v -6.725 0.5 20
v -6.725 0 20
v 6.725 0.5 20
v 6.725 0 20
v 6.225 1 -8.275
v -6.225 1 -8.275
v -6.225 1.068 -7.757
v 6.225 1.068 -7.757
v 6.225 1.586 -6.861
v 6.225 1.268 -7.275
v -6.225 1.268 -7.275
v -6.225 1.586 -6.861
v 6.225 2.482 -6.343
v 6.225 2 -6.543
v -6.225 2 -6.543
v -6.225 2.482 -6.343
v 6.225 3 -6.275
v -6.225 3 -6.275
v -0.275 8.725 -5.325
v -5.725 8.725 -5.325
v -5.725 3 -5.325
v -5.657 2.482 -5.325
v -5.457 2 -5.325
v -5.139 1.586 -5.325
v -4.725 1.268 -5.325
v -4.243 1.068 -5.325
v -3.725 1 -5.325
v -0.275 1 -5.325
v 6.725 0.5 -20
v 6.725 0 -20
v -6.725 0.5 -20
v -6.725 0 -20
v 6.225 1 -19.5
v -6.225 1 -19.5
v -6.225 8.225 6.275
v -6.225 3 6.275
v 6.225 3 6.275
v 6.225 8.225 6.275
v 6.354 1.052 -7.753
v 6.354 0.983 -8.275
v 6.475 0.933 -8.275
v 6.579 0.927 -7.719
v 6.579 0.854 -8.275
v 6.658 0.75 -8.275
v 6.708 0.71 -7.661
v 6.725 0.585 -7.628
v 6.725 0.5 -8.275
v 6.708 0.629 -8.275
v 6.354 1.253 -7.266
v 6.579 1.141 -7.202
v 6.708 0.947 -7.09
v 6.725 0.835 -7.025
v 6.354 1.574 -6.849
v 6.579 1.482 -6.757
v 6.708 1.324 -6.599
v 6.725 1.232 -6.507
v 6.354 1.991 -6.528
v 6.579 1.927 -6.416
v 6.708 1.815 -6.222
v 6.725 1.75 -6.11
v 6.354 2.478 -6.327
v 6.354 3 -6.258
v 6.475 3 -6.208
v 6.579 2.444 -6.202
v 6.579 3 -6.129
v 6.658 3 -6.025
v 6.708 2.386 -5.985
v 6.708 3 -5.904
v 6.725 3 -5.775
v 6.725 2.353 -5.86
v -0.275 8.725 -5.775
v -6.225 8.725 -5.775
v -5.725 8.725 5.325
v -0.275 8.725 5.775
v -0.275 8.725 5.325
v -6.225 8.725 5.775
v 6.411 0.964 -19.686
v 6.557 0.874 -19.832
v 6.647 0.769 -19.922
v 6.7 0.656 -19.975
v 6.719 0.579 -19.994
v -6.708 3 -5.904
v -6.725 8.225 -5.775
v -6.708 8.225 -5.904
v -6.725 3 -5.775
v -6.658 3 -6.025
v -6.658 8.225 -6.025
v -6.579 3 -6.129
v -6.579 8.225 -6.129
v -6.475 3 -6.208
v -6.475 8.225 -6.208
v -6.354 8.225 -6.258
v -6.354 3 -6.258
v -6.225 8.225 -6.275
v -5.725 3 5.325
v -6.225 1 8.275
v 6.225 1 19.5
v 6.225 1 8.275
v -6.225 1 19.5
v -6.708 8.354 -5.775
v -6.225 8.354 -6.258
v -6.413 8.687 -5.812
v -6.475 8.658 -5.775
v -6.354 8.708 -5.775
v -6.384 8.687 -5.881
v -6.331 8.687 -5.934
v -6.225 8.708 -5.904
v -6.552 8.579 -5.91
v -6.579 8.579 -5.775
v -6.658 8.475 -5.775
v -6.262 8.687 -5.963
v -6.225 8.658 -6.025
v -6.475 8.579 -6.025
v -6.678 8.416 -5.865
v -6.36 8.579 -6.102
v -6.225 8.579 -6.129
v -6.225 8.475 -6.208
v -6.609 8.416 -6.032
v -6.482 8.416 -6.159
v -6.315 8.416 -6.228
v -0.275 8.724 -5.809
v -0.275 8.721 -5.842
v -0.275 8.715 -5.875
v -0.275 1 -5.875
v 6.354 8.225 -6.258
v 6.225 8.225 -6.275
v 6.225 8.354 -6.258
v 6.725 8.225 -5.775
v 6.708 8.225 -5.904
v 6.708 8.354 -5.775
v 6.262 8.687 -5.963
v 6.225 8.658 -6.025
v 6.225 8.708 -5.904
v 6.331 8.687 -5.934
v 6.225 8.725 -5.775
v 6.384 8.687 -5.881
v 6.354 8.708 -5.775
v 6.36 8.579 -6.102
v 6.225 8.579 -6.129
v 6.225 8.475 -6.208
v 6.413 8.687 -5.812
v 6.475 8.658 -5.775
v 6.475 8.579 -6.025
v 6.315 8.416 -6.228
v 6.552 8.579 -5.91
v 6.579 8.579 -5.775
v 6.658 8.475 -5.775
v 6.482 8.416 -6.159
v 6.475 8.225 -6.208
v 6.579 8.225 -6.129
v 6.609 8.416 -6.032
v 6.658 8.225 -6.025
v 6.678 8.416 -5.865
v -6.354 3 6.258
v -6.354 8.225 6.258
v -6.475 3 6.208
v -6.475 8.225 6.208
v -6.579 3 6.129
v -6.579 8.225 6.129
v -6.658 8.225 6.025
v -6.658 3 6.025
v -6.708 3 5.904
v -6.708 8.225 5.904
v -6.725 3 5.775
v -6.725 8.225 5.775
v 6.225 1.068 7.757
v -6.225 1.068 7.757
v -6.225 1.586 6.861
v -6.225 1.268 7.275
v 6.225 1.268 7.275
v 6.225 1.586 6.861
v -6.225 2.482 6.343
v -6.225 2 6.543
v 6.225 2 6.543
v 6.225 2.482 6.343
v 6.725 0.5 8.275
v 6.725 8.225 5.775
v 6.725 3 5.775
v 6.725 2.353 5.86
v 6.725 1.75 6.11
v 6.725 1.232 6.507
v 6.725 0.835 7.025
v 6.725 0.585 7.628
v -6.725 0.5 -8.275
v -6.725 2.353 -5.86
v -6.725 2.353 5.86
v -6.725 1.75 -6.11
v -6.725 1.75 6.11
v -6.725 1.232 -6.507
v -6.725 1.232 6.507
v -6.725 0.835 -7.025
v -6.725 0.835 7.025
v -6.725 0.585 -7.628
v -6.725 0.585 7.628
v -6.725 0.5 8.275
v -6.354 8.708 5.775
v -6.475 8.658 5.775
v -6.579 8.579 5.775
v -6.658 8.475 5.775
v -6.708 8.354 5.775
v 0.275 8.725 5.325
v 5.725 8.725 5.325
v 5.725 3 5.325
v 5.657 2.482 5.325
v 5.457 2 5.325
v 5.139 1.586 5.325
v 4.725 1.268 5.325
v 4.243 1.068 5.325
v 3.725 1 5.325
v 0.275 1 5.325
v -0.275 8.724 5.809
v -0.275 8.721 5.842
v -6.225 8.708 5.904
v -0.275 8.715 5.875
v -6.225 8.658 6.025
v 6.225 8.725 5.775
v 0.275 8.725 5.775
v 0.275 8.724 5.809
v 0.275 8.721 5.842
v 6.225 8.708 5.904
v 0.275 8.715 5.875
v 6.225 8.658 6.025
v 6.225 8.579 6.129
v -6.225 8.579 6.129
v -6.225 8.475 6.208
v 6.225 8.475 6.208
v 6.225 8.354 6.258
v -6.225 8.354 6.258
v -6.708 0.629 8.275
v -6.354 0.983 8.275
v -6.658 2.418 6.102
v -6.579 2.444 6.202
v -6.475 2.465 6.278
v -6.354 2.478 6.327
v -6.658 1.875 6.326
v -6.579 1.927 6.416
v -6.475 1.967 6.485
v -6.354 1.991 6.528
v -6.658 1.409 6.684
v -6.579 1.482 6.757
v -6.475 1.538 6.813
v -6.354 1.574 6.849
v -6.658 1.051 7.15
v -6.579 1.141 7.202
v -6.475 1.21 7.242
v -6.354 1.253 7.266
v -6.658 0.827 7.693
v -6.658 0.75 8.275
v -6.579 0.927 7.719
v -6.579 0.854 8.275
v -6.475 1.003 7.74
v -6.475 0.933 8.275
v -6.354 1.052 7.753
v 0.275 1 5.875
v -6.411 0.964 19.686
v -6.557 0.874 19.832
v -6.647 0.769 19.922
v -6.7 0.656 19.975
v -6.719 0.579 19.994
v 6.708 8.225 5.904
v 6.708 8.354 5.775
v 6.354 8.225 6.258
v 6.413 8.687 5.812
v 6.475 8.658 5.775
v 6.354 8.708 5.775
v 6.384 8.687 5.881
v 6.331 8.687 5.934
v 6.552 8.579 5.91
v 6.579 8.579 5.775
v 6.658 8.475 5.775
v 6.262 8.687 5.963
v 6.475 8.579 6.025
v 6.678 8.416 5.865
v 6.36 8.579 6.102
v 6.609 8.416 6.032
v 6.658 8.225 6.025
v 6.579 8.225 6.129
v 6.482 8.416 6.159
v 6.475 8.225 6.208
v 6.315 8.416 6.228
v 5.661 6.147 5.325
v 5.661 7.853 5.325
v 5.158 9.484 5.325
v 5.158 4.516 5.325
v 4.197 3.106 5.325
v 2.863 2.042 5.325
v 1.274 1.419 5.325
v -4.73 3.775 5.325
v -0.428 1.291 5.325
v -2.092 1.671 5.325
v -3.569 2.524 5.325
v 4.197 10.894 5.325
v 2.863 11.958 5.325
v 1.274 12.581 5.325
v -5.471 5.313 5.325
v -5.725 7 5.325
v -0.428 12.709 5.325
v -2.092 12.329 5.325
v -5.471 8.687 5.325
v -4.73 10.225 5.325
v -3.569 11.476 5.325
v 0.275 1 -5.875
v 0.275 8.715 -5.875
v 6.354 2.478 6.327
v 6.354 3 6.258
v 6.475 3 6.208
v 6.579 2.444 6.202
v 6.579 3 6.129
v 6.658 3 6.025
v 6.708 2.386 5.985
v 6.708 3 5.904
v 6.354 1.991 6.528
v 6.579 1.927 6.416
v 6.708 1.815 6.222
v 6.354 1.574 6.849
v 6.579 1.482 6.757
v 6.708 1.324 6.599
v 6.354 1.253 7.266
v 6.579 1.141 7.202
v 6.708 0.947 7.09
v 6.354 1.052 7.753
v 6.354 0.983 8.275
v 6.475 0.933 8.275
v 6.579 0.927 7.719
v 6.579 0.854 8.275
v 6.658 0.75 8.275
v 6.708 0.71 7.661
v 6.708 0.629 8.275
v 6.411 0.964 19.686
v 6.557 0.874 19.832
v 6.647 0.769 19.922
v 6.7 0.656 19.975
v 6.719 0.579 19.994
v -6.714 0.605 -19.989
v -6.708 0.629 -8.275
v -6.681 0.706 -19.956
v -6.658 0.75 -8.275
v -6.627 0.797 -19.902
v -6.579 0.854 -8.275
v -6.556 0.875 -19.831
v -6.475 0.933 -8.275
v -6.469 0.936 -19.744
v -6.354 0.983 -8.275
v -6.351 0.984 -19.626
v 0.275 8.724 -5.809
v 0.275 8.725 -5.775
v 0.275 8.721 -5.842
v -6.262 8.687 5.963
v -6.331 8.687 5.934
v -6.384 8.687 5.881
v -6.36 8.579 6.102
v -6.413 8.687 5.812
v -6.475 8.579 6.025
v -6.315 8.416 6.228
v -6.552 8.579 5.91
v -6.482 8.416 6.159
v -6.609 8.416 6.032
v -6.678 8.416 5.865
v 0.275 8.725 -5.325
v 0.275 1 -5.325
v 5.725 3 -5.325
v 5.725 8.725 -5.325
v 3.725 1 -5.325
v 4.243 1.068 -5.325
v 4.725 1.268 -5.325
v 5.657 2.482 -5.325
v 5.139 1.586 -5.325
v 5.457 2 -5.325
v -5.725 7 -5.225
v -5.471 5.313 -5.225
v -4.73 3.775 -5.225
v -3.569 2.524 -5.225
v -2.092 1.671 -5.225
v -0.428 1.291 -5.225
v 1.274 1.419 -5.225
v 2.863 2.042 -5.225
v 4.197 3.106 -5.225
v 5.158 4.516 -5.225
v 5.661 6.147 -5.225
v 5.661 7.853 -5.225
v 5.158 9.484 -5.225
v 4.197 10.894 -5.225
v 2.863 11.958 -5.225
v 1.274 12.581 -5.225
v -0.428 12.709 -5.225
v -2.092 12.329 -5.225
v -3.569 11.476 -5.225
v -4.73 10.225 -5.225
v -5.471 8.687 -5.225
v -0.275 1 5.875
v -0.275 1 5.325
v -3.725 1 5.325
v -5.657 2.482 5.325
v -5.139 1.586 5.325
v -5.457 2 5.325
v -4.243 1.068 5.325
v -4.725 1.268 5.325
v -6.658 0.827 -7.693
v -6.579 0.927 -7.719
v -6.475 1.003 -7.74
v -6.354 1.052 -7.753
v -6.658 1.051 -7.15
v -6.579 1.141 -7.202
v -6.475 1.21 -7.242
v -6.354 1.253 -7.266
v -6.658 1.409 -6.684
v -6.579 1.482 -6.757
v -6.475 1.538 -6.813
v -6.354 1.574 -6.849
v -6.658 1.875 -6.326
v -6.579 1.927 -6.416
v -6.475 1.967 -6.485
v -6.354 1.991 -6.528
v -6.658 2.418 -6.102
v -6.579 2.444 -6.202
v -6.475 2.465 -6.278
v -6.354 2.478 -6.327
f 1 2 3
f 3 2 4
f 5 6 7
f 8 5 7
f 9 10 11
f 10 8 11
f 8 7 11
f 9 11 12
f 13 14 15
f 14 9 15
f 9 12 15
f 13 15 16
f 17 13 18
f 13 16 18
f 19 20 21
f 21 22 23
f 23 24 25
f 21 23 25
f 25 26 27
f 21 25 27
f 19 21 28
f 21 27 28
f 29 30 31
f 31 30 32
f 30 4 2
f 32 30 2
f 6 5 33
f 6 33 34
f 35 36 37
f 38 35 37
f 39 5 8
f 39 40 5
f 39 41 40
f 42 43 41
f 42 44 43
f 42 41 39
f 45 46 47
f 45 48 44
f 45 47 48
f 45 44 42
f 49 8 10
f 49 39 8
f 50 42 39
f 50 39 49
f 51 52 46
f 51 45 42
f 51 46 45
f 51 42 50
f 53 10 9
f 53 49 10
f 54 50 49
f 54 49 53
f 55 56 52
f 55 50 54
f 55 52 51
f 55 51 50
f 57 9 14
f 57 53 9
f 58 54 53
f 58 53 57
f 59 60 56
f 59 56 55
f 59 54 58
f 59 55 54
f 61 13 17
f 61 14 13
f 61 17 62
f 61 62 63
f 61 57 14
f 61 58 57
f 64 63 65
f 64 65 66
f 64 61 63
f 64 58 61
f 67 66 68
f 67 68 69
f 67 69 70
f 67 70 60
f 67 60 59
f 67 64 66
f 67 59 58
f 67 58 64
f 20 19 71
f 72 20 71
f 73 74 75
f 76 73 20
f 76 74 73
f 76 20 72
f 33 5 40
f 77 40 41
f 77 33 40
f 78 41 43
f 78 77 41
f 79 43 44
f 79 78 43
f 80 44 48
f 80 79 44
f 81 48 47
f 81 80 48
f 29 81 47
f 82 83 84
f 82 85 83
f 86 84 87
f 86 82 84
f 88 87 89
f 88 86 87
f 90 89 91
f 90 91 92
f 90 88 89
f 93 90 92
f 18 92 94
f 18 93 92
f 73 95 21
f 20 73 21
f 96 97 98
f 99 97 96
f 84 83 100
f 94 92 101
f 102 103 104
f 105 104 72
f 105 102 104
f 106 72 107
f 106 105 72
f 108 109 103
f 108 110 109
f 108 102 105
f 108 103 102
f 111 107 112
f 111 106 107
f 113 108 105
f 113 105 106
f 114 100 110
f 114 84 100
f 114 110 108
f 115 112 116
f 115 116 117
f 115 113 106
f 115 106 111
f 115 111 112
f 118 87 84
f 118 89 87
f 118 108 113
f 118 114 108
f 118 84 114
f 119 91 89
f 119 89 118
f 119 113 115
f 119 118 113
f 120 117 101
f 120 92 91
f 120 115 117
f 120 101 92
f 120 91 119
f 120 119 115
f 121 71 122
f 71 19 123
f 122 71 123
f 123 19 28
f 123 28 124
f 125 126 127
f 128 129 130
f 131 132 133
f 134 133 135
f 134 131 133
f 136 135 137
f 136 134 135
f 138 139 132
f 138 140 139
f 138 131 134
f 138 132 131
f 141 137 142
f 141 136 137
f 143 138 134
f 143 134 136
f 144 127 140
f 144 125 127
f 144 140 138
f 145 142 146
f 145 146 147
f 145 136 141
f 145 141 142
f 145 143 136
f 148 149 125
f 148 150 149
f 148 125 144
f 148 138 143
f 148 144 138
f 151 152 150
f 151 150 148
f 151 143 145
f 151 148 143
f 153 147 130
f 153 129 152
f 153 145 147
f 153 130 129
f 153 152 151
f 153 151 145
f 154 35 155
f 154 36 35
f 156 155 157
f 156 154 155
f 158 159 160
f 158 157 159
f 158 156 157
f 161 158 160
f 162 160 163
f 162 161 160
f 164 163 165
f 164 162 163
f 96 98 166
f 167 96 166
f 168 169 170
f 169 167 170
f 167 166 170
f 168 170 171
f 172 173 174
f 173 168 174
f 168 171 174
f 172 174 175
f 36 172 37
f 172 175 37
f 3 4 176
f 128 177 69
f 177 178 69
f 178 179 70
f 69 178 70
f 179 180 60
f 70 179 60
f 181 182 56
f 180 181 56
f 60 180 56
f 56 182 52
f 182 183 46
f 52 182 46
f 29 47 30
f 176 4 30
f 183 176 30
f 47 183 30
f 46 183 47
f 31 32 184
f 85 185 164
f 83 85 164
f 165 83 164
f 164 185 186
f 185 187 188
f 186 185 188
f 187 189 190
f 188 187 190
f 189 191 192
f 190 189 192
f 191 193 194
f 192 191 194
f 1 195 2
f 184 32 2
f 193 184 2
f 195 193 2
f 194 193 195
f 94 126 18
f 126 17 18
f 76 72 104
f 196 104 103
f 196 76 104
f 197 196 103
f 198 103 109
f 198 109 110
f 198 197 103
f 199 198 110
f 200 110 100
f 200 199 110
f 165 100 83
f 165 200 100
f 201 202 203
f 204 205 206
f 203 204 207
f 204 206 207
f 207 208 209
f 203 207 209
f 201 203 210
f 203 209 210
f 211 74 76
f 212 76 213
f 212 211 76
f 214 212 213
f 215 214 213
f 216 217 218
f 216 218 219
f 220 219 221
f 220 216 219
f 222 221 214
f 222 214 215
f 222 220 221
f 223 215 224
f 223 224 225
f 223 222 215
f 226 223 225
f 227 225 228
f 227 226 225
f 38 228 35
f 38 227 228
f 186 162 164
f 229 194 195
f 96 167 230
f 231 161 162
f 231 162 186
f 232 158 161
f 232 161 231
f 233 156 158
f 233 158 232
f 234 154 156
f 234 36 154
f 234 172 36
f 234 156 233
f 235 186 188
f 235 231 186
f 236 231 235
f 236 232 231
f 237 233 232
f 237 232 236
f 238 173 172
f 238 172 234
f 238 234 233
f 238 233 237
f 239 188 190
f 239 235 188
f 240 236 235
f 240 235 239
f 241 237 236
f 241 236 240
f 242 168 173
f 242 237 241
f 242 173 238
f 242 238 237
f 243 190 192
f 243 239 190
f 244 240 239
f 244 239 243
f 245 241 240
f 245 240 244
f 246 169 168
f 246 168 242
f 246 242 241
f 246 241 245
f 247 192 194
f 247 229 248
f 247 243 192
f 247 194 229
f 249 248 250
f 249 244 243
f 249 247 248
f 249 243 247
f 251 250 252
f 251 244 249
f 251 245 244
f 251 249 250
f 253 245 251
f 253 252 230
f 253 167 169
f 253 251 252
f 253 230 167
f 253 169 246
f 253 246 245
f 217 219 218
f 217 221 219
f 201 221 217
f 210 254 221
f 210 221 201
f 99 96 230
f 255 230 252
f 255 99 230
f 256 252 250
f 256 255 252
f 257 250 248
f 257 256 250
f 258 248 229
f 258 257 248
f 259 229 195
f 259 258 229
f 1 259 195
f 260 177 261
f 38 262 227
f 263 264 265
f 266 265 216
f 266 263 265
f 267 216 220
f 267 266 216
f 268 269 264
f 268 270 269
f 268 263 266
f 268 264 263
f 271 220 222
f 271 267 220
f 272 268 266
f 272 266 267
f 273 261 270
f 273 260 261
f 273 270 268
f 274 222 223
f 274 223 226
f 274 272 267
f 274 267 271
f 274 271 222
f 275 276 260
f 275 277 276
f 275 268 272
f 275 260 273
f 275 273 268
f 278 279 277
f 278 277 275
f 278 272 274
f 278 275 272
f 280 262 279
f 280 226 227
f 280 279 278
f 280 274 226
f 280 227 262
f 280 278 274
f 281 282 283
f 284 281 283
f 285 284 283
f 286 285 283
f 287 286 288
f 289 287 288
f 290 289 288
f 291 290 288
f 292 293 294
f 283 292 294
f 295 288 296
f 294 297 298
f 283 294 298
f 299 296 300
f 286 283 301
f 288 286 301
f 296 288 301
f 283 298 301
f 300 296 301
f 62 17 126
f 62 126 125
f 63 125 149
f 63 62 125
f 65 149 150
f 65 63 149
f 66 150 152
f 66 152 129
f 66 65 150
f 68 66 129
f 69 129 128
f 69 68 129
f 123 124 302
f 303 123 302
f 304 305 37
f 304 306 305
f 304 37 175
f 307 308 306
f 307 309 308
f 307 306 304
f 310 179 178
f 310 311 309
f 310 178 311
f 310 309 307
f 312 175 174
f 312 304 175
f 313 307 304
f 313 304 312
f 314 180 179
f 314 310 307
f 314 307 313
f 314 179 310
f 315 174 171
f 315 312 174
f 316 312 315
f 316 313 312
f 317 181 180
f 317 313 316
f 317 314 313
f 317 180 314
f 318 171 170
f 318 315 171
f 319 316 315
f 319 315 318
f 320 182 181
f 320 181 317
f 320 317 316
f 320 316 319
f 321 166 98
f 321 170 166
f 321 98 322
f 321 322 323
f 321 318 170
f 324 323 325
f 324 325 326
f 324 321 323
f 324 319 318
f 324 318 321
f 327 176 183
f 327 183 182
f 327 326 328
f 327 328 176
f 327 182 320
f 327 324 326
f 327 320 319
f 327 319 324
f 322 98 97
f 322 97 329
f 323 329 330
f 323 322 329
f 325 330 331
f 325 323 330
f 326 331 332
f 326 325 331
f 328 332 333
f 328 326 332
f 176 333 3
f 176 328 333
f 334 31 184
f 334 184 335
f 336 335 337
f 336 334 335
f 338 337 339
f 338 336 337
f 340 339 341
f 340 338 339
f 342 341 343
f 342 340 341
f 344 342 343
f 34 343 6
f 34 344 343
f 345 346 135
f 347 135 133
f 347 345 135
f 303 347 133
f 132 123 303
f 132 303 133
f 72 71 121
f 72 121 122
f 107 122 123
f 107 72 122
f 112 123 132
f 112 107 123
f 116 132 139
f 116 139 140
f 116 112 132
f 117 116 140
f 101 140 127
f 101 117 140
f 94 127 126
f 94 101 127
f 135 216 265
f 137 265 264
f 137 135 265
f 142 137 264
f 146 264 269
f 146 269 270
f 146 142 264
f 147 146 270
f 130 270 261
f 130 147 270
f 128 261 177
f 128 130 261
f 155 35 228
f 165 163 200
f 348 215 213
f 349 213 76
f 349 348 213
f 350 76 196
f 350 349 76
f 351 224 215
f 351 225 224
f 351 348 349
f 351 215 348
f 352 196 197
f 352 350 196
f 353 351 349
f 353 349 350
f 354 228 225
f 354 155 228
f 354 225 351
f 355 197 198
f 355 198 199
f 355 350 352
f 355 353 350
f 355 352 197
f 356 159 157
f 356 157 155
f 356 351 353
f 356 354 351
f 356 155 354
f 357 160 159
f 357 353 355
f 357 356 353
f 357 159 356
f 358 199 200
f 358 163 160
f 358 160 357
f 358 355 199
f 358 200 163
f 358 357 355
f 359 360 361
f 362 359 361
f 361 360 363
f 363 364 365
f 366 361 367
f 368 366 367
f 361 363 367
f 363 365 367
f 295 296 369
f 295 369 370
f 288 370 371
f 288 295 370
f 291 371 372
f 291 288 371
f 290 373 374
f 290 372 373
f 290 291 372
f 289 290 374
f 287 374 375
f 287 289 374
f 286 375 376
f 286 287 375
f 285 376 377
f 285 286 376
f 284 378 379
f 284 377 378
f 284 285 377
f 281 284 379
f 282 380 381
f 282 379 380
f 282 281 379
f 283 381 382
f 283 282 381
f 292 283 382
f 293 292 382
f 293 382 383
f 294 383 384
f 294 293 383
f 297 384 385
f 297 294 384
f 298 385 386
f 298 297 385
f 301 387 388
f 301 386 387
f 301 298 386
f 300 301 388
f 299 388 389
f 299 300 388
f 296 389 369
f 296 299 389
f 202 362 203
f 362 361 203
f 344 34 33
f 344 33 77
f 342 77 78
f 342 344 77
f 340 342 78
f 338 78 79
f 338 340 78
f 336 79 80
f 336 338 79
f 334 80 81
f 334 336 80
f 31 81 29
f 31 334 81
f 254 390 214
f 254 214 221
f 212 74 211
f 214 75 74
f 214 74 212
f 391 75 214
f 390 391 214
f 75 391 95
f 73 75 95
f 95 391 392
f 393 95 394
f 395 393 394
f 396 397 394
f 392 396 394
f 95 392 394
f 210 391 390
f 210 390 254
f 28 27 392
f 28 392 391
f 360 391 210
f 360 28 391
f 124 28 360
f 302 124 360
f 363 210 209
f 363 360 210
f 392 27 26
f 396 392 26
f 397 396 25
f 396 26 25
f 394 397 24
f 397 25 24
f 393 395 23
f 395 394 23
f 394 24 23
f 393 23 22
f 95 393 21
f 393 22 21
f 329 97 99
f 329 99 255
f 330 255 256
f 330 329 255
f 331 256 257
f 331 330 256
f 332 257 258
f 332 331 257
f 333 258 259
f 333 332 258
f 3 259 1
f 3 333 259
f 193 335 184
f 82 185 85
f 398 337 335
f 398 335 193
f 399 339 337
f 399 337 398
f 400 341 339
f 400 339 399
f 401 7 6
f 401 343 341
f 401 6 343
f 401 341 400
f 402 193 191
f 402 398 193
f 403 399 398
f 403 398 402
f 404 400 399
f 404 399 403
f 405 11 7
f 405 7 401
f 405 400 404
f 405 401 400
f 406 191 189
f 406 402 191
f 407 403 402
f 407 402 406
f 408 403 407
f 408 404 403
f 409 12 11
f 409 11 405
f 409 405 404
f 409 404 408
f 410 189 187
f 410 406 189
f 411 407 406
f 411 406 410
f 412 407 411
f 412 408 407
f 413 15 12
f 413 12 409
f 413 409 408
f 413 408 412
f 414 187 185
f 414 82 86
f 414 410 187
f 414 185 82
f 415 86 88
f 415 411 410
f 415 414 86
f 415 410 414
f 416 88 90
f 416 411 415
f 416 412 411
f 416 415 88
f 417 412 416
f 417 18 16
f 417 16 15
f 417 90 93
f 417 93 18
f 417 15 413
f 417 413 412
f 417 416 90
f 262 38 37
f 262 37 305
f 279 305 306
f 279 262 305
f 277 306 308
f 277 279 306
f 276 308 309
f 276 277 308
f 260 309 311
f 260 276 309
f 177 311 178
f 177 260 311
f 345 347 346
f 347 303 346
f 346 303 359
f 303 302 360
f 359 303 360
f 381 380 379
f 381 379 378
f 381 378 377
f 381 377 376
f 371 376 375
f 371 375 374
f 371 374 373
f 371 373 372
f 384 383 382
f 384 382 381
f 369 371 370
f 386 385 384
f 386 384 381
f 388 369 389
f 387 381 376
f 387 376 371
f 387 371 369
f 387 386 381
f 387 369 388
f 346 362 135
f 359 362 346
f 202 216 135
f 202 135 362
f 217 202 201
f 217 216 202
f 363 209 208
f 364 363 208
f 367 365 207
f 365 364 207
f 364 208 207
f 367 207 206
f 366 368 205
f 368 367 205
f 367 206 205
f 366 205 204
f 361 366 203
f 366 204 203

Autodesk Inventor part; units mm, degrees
ref_plane "YZ Plane" through (0, 0, 0) normal (1, 0, 0) x (0, 1, 0)
ref_plane "XZ Plane" through (0, 0, 0) normal (0, 1, 0) x (-1, 0, 0)
ref_plane "XY Plane" through (0, 0, 0) normal (0, 0, 1) x (1, 0, 0)
sketch "Sketch1" plane through (0, 0, 0) normal (0, 1, 0) x (-1, 0, 0)
  line L0 (-5.725, 5.325) -> (5.725, 5.325)
  line L1 (5.725, 5.325) -> (5.725, -5.325)
  line L2 (5.725, -5.325) -> (-5.725, -5.325)
  line L3 (-5.725, -5.325) -> (-5.725, 5.325)
  line L4 (-5.725, 5.325) -> (5.725, -5.325) construction
  line L5 (5.725, 5.325) -> (-5.725, -5.325) construction
  line L6 (6.725, 20) -> (-6.725, 20)
  line L7 (-6.725, 20) -> (-6.725, -20)
  line L8 (-6.725, -20) -> (6.725, -20)
  line L9 (6.725, -20) -> (6.725, 20)
  line L10 (6.725, 20) -> (-6.725, -20) construction
  line L11 (-6.725, 20) -> (6.725, -20) construction
  line L12 (6.725, 6.275) -> (-6.725, 6.275)
  line L13 (-6.725, 6.275) -> (-6.725, -6.275)
  line L14 (-6.725, -6.275) -> (6.725, -6.275)
  line L15 (6.725, -6.275) -> (6.725, 6.275)
  line L16 (6.725, 6.275) -> (-6.725, -6.275) construction
  line L17 (-6.725, 6.275) -> (6.725, -6.275) construction
  point P0 (0, 0)
  dimension "d0" = 11.45
  dimension "d1" = 10.65
  dimension "d2" = 13.45
  dimension "d3" = 40
  dimension "d4" = 12.55
  dimension "d5" = 13.45
extrude "Extrusion1" add sketch "Sketch1" along normal blind 1 contours L9 L12 L7 L6 | L9 L8 L7 L14
extrude "Extrusion2" add sketch "Sketch1" along normal blind 8.725 contours L9 L14 L7 L12
extrude "Extrusion3" add sketch "Sketch1" along normal blind 1 contours L0 L1 L2 L3
fillet "Fillet1" radius 2 2 edges at (5.725, 1, 0) (-5.725, 1, 0)
fillet "Fillet2" radius 2 2 edges at (0, 1, -6.275) (0, 1, 6.275)
fillet "Fillet3" radius 0.5 18 edges at (-6.725, 1.5858, -6.8608) (-6.725, 1, -14.1375) (-6.725, 5.8625, -6.275) (6.725, 1.5858, -6.8608) (6.725, 1, -14.1375) (6.725, 5.8625, -6.275) (0, 1, -20) (0, 1, 20) (-6.725, 1.5858, 6.8608) (-6.725, 5.8625, 6.275) (-6.725, 1, 14.1375) (6.725, 5.8625, 6.275) (6.725, 1, 14.1375) (6.725, 1.5858, 6.8608) (-6.725, 8.725, 0) (0, 8.725, -6.275) (6.725, 8.725, 0) (0, 8.725, 6.275)
sketch "Sketch2" plane through (5.725, 8.725, 5.325) normal (0, 0, -1) x (-1, 0, 0)
  arc A0 (9.45, -7.725) -> (11.45, -5.725) centre (9.45, -5.725) ccw construction
  line L0 (11.45, -5.725) -> (11.45, 0) construction
  line L1 (0, 0) -> (11.45, 0) construction
  line L2 (0, -5.725) -> (0, 0) construction
  arc A1 (0, -5.725) -> (2, -7.725) centre (2, -5.725) ccw construction
  line L3 (2, -7.725) -> (9.45, -7.725) construction
  circle A2 centre (5.725, -1.725) radius 5.725
  point P0 (5.725, -8.725)
  dimension "d15" = 11.45
  dimension "d16" = 6
extrude "Extrusion4" add sketch "Sketch2" along normal blind 10.55 separate body
sketch "Sketch3" plane through (0, 1, 0) normal (0, 1, 0) x (1, 0, 0)
  line L0 (-3.725, -5.325) -> (-3.725, 5.325) construction
  line L1 (3.725, -5.325) -> (-3.725, -5.325) construction
  line L2 (3.725, 5.325) -> (3.725, -5.325) construction
  line L3 (-3.725, 5.325) -> (3.725, 5.325) construction
  line L4 (-0.275, -5.875) -> (0.275, -5.875)
  line L5 (0.275, -5.875) -> (0.275, -5.325)
  line L6 (0.275, -5.325) -> (-0.275, -5.325)
  line L7 (-0.275, -5.325) -> (-0.275, -5.875)
  line L8 (-0.275, -5.875) -> (0.275, -5.325) construction
  line L9 (0.275, -5.875) -> (-0.275, -5.325) construction
  line L10 (0, -5.325) -> (0, 5.325) construction
  line L11 (-3.725, -5.325) -> (-3.725, 5.325) construction
  line L12 (-3.725, -5.325) -> (3.725, -5.325) construction
  line L13 (-3.725, 5.325) -> (3.725, 5.325) construction
  line L14 (-5.725, 5.325) -> (5.725, 5.325) construction
  line L15 (5.725, -5.325) -> (-5.725, -5.325) construction
  line L16 (-3.725, 0) -> (3.725, 0) construction
  line L17 (-0.275, 5.875) -> (0.275, 5.875)
  line L18 (0.275, 5.875) -> (0.275, 5.325)
  line L19 (0.275, 5.325) -> (-0.275, 5.325)
  line L20 (-0.275, 5.325) -> (-0.275, 5.875)
  point P0 (0, 0)
  point P1 (0, -5.6)
  point P2 (0, -5.6)
  dimension "d19" = 0.55
  dimension "d20" = 0.55
extrude "Extrusion5" cut sketch "Sketch3" along normal blind 10
properties part number "led_and_battery_holder"
